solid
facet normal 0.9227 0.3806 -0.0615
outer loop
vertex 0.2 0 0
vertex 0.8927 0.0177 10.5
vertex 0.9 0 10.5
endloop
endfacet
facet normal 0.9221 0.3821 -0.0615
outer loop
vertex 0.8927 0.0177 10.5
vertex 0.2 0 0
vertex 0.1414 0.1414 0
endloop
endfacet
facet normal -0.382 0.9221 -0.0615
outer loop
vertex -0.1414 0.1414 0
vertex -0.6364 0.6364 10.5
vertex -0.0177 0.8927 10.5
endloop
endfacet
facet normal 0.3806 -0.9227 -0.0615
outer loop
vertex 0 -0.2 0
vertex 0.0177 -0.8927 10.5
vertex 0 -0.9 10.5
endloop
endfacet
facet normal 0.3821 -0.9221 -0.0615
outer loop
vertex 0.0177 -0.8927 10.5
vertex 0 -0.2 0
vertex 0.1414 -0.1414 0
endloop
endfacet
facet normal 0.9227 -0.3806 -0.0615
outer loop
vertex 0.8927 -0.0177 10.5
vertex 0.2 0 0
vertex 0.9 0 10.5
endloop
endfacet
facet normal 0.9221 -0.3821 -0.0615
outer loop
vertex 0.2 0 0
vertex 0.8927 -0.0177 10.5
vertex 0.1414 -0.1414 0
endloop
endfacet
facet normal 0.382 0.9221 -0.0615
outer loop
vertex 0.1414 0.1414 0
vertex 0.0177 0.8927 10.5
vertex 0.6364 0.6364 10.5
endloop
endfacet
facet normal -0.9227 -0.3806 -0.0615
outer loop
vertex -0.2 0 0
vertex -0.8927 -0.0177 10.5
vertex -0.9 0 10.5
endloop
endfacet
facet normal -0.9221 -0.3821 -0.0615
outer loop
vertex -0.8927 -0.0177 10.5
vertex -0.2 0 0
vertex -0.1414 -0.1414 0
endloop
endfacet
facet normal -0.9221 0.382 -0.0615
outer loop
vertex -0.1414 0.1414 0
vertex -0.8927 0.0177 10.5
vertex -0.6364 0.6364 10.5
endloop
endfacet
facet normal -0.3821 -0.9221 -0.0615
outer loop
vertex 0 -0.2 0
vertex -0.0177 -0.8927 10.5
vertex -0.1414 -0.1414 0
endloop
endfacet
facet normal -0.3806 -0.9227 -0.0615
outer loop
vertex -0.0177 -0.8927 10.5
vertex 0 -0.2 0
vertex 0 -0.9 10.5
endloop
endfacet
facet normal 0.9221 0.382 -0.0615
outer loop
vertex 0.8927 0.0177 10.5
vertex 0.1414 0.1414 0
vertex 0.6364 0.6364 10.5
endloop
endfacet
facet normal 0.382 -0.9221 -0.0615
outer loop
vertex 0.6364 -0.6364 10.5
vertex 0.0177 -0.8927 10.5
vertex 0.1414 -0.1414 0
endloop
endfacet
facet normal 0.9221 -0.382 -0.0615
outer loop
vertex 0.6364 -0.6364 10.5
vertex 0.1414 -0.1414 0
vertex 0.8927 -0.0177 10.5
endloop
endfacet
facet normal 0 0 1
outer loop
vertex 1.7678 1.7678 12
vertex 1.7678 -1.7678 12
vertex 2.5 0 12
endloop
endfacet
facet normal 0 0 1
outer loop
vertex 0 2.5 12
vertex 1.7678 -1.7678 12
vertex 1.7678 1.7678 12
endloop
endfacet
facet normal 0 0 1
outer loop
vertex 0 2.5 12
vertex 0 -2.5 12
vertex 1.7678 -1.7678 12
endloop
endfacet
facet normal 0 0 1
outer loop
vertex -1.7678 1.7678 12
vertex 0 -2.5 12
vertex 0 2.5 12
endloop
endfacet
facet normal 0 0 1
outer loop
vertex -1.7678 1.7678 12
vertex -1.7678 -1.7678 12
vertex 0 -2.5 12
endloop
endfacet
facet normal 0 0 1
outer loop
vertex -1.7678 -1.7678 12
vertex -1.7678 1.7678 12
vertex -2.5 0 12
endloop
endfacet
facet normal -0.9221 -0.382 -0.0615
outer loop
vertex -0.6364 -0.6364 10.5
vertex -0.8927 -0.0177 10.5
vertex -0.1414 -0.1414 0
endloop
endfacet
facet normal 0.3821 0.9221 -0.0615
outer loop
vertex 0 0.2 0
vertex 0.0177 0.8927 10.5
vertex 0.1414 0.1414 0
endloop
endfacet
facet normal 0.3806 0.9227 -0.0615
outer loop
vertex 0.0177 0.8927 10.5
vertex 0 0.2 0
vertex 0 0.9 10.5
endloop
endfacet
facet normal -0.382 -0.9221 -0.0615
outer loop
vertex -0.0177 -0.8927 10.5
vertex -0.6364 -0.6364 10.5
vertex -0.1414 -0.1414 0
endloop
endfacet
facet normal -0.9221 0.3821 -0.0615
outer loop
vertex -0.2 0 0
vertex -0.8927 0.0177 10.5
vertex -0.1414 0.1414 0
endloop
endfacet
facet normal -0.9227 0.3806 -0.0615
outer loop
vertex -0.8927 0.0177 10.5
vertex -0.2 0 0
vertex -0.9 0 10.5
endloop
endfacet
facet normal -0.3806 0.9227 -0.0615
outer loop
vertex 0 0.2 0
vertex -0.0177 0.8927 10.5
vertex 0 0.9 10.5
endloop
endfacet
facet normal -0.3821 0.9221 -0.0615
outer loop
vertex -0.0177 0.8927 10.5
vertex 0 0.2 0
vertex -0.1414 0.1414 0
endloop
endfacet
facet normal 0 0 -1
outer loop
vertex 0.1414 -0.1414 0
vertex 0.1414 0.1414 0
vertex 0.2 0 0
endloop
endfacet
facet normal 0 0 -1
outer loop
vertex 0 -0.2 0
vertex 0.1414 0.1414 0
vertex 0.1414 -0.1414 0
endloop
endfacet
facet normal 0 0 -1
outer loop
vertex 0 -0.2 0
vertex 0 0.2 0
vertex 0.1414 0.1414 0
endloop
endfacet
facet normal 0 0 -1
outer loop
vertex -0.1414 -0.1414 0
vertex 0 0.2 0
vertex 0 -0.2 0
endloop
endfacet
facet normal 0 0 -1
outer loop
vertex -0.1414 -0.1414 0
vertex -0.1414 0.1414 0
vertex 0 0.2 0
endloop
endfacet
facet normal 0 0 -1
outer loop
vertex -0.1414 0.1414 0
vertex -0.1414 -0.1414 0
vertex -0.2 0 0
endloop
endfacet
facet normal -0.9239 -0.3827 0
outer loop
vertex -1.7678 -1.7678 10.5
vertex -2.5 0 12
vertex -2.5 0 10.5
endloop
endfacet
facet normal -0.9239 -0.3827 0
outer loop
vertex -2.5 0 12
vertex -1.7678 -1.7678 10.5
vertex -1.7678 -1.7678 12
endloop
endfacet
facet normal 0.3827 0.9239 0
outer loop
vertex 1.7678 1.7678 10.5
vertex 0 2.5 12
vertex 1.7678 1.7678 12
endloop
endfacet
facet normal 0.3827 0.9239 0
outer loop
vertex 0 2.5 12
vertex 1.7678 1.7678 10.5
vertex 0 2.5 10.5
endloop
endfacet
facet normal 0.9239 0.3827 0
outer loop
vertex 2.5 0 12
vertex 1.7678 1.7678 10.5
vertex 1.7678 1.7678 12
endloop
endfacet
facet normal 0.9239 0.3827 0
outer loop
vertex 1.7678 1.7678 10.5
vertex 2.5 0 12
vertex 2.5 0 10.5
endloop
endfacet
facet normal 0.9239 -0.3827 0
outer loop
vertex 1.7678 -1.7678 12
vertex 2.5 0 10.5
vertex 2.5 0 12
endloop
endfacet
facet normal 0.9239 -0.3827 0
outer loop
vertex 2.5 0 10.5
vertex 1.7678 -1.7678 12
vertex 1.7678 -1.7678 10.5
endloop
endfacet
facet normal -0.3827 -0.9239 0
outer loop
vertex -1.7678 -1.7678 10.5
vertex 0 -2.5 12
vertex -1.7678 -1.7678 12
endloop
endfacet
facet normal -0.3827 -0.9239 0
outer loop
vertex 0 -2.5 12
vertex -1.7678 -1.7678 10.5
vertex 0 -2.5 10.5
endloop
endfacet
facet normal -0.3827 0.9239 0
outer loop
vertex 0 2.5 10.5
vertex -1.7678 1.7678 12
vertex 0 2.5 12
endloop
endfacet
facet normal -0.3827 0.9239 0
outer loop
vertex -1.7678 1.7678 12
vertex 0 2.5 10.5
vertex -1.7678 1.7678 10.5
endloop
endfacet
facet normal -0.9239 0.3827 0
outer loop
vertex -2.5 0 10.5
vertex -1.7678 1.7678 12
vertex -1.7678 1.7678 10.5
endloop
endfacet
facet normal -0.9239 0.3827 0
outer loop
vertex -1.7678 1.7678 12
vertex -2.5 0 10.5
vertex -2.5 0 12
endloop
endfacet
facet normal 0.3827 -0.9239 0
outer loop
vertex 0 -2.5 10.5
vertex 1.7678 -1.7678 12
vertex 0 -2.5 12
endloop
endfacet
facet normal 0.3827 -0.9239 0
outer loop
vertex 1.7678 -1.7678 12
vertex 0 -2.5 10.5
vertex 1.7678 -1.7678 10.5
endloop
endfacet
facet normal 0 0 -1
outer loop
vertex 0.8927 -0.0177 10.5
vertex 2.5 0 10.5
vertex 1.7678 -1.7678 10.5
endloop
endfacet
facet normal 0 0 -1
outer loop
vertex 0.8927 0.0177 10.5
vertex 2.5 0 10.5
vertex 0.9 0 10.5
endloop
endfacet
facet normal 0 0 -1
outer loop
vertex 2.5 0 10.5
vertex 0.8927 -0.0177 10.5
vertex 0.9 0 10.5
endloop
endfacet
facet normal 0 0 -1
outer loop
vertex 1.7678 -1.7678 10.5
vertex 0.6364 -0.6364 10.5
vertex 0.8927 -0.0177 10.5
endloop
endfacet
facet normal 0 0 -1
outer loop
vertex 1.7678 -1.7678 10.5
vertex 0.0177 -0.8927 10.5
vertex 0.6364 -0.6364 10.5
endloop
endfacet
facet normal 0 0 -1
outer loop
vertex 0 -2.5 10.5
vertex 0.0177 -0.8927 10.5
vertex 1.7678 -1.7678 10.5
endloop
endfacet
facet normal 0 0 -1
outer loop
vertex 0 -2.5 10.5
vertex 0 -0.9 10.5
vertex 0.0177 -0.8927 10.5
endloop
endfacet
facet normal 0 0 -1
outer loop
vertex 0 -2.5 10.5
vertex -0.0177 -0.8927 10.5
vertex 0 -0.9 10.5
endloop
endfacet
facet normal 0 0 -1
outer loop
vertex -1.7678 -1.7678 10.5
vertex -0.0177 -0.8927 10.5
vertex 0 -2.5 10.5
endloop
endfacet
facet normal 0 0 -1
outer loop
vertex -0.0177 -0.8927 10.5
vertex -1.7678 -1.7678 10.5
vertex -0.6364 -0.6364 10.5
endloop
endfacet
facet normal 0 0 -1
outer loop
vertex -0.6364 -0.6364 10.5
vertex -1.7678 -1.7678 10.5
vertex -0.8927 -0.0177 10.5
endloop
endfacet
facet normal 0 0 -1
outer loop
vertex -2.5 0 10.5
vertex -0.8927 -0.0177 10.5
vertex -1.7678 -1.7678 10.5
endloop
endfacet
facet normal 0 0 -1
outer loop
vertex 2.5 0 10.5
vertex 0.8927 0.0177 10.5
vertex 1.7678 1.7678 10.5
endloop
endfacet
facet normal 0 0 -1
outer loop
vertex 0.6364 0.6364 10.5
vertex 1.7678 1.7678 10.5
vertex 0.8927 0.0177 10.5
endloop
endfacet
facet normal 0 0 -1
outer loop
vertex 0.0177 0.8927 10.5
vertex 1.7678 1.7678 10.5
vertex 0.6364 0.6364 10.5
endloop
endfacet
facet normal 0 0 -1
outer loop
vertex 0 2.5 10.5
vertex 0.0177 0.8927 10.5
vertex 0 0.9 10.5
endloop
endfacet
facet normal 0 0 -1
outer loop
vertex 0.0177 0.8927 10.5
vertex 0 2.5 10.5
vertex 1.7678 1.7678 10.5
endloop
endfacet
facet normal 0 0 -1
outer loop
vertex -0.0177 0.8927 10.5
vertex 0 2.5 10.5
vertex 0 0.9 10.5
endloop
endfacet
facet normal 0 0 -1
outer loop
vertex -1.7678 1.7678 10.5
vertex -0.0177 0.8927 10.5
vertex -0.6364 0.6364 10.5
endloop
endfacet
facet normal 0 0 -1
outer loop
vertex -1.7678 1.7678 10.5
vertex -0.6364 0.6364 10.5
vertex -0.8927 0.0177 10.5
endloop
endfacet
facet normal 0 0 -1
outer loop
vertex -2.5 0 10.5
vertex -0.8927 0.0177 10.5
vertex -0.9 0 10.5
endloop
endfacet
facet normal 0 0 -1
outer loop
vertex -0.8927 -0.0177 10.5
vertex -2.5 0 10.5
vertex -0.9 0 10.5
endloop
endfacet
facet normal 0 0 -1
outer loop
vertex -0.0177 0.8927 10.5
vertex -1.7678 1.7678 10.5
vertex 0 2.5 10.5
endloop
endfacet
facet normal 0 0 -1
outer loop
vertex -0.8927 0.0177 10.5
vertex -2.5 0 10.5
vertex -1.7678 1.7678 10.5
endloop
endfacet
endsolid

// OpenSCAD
// file: _cookie_cutter.scad
rim_bottom_width = .4;
rim_top_width = 2;
rim_height = 12;
rim_base_height = 1.5;
rim_base_width = 5;


module rim_shape() {
	union() {
		cylinder(h = rim_height, d1 = rim_bottom_width, d2 = rim_top_width, $fn = 8);
		
		translate([0, 0, rim_height - rim_base_height])
			cylinder(h = rim_base_height, d = rim_base_width, $fn = 8);
	}
}

module cookie_cutter() {
	union() {
		minkowski() {
			linear_extrude(height = .001) {
				difference() {
					minkowski() {
						children(0);
						circle(r = .01, $fn = 4);
					}
					
					children(0);
				}
			}
			
			rim_shape();
		}
		
		if ($children > 1) {
			translate([0, 0, rim_height - rim_base_height])
				linear_extrude(height = rim_base_height)
					children(1);
		}
	}
}
// main file
use <_cookie_cutter.scad>

render(convexity = 10)
	cookie_cutter() {
		import("koubachi_k.dxf", layer = "shape");
		import("koubachi_k.dxf", layer = "struts");
	}
